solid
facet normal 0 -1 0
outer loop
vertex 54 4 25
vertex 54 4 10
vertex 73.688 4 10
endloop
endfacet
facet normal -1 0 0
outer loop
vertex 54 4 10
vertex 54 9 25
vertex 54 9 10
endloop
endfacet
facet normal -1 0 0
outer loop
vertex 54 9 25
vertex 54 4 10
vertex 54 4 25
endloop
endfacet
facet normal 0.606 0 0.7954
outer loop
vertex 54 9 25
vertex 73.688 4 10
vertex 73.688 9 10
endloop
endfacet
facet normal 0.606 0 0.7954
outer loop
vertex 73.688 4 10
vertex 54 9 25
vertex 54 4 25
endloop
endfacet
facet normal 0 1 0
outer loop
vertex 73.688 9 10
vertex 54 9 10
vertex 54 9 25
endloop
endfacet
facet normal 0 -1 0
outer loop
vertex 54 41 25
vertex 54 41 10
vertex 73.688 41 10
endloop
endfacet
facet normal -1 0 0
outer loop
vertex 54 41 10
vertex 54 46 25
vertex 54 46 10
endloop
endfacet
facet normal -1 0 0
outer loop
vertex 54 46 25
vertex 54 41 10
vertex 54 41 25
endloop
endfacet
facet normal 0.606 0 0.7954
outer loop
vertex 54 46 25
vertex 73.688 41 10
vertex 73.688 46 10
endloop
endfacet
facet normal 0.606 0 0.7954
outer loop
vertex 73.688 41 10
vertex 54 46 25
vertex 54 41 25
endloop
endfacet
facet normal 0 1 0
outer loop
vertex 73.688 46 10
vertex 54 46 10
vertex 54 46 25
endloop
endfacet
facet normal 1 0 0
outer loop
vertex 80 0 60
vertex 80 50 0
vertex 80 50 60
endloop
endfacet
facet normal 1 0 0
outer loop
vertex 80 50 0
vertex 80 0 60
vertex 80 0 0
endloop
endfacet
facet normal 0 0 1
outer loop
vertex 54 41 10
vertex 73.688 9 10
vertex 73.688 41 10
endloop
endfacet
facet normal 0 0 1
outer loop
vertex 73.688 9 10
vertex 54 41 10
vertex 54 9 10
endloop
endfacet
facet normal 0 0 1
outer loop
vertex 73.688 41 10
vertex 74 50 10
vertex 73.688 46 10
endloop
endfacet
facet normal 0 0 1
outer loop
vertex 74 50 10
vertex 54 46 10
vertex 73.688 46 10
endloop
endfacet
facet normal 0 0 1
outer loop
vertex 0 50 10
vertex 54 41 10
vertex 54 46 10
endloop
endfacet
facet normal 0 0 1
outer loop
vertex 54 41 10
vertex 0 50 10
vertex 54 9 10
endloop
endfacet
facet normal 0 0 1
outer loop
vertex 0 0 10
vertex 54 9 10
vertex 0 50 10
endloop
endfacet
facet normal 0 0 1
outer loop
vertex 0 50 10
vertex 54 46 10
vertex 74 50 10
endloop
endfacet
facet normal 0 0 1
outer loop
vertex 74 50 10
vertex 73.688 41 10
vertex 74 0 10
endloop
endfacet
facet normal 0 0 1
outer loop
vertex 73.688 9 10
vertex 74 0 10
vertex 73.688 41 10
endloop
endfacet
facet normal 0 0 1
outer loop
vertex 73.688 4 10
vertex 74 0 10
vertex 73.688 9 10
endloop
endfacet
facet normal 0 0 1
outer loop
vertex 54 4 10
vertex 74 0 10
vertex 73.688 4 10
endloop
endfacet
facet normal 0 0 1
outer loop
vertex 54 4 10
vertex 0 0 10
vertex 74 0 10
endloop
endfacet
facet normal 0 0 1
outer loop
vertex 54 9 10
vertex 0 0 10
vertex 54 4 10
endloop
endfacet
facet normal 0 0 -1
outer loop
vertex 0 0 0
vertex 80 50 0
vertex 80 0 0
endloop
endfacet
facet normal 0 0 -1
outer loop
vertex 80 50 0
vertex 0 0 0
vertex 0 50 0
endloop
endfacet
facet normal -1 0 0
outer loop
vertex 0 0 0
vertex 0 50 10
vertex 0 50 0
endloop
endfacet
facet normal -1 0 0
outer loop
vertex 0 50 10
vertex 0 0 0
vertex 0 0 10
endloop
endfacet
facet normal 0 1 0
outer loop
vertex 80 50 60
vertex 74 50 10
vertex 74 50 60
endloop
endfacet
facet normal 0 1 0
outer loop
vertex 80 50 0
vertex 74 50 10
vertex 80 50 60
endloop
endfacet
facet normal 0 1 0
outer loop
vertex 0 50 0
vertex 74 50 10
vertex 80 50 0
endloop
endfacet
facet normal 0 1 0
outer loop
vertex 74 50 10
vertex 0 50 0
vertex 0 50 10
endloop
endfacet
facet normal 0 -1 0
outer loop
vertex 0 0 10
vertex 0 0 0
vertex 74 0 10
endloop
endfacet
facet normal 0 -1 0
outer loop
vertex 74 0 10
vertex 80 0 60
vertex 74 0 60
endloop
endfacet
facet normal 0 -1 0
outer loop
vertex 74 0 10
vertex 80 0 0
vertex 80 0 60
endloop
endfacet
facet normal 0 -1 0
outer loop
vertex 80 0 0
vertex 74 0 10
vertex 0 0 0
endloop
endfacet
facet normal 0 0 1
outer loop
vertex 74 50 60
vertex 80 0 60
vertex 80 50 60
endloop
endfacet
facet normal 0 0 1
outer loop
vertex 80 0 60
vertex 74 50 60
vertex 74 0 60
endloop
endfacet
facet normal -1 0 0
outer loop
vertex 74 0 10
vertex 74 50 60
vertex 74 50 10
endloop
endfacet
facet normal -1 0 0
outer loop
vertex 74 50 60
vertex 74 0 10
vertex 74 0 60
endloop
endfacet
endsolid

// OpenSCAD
$fn = 32;

// ----------------------------------------------------------------------
// Rib bracket: 2-gusset L bracket
// ----------------------------------------------------------------------

// --- parameters (mm) ---
base_l = 80;              // foot length, X
base_w = 50;              // foot width, Y
base_t = 10;              // foot thickness
plate_t = 6;              // upright plate thickness
plate_h = 60;             // overall height
gus_l = 20;               // gusset leg along the foot
gus_h = 16;               // gusset height
gus_t = 5;                // gusset thickness
gus_edge = 4;             // gusset margin from the foot edge
n_gus = 2;                // gusset count
fit_tol = 0.05;           // tolerance for press fits, mm
free_tol = 0.3;           // tolerance for clearance fits, mm

gus_pitch = (base_w - 2 * gus_edge - gus_t) / (n_gus - 1);  // gusset pitch

union() {
  cube([base_l, base_w, base_t]);
  translate([base_l - plate_t, 0, base_t - 1])
    cube([plate_t, base_w, plate_h - base_t + 1]);
  for (i = [0 : n_gus - 1])
    translate([base_l - plate_t - gus_l, gus_edge + i * gus_pitch, base_t - 1])
      rotate([-90, 0, 0])
        linear_extrude(height = gus_t)
          polygon(points = [[0, 0], [gus_l + 1, 0], [0, -gus_h]]);
}
